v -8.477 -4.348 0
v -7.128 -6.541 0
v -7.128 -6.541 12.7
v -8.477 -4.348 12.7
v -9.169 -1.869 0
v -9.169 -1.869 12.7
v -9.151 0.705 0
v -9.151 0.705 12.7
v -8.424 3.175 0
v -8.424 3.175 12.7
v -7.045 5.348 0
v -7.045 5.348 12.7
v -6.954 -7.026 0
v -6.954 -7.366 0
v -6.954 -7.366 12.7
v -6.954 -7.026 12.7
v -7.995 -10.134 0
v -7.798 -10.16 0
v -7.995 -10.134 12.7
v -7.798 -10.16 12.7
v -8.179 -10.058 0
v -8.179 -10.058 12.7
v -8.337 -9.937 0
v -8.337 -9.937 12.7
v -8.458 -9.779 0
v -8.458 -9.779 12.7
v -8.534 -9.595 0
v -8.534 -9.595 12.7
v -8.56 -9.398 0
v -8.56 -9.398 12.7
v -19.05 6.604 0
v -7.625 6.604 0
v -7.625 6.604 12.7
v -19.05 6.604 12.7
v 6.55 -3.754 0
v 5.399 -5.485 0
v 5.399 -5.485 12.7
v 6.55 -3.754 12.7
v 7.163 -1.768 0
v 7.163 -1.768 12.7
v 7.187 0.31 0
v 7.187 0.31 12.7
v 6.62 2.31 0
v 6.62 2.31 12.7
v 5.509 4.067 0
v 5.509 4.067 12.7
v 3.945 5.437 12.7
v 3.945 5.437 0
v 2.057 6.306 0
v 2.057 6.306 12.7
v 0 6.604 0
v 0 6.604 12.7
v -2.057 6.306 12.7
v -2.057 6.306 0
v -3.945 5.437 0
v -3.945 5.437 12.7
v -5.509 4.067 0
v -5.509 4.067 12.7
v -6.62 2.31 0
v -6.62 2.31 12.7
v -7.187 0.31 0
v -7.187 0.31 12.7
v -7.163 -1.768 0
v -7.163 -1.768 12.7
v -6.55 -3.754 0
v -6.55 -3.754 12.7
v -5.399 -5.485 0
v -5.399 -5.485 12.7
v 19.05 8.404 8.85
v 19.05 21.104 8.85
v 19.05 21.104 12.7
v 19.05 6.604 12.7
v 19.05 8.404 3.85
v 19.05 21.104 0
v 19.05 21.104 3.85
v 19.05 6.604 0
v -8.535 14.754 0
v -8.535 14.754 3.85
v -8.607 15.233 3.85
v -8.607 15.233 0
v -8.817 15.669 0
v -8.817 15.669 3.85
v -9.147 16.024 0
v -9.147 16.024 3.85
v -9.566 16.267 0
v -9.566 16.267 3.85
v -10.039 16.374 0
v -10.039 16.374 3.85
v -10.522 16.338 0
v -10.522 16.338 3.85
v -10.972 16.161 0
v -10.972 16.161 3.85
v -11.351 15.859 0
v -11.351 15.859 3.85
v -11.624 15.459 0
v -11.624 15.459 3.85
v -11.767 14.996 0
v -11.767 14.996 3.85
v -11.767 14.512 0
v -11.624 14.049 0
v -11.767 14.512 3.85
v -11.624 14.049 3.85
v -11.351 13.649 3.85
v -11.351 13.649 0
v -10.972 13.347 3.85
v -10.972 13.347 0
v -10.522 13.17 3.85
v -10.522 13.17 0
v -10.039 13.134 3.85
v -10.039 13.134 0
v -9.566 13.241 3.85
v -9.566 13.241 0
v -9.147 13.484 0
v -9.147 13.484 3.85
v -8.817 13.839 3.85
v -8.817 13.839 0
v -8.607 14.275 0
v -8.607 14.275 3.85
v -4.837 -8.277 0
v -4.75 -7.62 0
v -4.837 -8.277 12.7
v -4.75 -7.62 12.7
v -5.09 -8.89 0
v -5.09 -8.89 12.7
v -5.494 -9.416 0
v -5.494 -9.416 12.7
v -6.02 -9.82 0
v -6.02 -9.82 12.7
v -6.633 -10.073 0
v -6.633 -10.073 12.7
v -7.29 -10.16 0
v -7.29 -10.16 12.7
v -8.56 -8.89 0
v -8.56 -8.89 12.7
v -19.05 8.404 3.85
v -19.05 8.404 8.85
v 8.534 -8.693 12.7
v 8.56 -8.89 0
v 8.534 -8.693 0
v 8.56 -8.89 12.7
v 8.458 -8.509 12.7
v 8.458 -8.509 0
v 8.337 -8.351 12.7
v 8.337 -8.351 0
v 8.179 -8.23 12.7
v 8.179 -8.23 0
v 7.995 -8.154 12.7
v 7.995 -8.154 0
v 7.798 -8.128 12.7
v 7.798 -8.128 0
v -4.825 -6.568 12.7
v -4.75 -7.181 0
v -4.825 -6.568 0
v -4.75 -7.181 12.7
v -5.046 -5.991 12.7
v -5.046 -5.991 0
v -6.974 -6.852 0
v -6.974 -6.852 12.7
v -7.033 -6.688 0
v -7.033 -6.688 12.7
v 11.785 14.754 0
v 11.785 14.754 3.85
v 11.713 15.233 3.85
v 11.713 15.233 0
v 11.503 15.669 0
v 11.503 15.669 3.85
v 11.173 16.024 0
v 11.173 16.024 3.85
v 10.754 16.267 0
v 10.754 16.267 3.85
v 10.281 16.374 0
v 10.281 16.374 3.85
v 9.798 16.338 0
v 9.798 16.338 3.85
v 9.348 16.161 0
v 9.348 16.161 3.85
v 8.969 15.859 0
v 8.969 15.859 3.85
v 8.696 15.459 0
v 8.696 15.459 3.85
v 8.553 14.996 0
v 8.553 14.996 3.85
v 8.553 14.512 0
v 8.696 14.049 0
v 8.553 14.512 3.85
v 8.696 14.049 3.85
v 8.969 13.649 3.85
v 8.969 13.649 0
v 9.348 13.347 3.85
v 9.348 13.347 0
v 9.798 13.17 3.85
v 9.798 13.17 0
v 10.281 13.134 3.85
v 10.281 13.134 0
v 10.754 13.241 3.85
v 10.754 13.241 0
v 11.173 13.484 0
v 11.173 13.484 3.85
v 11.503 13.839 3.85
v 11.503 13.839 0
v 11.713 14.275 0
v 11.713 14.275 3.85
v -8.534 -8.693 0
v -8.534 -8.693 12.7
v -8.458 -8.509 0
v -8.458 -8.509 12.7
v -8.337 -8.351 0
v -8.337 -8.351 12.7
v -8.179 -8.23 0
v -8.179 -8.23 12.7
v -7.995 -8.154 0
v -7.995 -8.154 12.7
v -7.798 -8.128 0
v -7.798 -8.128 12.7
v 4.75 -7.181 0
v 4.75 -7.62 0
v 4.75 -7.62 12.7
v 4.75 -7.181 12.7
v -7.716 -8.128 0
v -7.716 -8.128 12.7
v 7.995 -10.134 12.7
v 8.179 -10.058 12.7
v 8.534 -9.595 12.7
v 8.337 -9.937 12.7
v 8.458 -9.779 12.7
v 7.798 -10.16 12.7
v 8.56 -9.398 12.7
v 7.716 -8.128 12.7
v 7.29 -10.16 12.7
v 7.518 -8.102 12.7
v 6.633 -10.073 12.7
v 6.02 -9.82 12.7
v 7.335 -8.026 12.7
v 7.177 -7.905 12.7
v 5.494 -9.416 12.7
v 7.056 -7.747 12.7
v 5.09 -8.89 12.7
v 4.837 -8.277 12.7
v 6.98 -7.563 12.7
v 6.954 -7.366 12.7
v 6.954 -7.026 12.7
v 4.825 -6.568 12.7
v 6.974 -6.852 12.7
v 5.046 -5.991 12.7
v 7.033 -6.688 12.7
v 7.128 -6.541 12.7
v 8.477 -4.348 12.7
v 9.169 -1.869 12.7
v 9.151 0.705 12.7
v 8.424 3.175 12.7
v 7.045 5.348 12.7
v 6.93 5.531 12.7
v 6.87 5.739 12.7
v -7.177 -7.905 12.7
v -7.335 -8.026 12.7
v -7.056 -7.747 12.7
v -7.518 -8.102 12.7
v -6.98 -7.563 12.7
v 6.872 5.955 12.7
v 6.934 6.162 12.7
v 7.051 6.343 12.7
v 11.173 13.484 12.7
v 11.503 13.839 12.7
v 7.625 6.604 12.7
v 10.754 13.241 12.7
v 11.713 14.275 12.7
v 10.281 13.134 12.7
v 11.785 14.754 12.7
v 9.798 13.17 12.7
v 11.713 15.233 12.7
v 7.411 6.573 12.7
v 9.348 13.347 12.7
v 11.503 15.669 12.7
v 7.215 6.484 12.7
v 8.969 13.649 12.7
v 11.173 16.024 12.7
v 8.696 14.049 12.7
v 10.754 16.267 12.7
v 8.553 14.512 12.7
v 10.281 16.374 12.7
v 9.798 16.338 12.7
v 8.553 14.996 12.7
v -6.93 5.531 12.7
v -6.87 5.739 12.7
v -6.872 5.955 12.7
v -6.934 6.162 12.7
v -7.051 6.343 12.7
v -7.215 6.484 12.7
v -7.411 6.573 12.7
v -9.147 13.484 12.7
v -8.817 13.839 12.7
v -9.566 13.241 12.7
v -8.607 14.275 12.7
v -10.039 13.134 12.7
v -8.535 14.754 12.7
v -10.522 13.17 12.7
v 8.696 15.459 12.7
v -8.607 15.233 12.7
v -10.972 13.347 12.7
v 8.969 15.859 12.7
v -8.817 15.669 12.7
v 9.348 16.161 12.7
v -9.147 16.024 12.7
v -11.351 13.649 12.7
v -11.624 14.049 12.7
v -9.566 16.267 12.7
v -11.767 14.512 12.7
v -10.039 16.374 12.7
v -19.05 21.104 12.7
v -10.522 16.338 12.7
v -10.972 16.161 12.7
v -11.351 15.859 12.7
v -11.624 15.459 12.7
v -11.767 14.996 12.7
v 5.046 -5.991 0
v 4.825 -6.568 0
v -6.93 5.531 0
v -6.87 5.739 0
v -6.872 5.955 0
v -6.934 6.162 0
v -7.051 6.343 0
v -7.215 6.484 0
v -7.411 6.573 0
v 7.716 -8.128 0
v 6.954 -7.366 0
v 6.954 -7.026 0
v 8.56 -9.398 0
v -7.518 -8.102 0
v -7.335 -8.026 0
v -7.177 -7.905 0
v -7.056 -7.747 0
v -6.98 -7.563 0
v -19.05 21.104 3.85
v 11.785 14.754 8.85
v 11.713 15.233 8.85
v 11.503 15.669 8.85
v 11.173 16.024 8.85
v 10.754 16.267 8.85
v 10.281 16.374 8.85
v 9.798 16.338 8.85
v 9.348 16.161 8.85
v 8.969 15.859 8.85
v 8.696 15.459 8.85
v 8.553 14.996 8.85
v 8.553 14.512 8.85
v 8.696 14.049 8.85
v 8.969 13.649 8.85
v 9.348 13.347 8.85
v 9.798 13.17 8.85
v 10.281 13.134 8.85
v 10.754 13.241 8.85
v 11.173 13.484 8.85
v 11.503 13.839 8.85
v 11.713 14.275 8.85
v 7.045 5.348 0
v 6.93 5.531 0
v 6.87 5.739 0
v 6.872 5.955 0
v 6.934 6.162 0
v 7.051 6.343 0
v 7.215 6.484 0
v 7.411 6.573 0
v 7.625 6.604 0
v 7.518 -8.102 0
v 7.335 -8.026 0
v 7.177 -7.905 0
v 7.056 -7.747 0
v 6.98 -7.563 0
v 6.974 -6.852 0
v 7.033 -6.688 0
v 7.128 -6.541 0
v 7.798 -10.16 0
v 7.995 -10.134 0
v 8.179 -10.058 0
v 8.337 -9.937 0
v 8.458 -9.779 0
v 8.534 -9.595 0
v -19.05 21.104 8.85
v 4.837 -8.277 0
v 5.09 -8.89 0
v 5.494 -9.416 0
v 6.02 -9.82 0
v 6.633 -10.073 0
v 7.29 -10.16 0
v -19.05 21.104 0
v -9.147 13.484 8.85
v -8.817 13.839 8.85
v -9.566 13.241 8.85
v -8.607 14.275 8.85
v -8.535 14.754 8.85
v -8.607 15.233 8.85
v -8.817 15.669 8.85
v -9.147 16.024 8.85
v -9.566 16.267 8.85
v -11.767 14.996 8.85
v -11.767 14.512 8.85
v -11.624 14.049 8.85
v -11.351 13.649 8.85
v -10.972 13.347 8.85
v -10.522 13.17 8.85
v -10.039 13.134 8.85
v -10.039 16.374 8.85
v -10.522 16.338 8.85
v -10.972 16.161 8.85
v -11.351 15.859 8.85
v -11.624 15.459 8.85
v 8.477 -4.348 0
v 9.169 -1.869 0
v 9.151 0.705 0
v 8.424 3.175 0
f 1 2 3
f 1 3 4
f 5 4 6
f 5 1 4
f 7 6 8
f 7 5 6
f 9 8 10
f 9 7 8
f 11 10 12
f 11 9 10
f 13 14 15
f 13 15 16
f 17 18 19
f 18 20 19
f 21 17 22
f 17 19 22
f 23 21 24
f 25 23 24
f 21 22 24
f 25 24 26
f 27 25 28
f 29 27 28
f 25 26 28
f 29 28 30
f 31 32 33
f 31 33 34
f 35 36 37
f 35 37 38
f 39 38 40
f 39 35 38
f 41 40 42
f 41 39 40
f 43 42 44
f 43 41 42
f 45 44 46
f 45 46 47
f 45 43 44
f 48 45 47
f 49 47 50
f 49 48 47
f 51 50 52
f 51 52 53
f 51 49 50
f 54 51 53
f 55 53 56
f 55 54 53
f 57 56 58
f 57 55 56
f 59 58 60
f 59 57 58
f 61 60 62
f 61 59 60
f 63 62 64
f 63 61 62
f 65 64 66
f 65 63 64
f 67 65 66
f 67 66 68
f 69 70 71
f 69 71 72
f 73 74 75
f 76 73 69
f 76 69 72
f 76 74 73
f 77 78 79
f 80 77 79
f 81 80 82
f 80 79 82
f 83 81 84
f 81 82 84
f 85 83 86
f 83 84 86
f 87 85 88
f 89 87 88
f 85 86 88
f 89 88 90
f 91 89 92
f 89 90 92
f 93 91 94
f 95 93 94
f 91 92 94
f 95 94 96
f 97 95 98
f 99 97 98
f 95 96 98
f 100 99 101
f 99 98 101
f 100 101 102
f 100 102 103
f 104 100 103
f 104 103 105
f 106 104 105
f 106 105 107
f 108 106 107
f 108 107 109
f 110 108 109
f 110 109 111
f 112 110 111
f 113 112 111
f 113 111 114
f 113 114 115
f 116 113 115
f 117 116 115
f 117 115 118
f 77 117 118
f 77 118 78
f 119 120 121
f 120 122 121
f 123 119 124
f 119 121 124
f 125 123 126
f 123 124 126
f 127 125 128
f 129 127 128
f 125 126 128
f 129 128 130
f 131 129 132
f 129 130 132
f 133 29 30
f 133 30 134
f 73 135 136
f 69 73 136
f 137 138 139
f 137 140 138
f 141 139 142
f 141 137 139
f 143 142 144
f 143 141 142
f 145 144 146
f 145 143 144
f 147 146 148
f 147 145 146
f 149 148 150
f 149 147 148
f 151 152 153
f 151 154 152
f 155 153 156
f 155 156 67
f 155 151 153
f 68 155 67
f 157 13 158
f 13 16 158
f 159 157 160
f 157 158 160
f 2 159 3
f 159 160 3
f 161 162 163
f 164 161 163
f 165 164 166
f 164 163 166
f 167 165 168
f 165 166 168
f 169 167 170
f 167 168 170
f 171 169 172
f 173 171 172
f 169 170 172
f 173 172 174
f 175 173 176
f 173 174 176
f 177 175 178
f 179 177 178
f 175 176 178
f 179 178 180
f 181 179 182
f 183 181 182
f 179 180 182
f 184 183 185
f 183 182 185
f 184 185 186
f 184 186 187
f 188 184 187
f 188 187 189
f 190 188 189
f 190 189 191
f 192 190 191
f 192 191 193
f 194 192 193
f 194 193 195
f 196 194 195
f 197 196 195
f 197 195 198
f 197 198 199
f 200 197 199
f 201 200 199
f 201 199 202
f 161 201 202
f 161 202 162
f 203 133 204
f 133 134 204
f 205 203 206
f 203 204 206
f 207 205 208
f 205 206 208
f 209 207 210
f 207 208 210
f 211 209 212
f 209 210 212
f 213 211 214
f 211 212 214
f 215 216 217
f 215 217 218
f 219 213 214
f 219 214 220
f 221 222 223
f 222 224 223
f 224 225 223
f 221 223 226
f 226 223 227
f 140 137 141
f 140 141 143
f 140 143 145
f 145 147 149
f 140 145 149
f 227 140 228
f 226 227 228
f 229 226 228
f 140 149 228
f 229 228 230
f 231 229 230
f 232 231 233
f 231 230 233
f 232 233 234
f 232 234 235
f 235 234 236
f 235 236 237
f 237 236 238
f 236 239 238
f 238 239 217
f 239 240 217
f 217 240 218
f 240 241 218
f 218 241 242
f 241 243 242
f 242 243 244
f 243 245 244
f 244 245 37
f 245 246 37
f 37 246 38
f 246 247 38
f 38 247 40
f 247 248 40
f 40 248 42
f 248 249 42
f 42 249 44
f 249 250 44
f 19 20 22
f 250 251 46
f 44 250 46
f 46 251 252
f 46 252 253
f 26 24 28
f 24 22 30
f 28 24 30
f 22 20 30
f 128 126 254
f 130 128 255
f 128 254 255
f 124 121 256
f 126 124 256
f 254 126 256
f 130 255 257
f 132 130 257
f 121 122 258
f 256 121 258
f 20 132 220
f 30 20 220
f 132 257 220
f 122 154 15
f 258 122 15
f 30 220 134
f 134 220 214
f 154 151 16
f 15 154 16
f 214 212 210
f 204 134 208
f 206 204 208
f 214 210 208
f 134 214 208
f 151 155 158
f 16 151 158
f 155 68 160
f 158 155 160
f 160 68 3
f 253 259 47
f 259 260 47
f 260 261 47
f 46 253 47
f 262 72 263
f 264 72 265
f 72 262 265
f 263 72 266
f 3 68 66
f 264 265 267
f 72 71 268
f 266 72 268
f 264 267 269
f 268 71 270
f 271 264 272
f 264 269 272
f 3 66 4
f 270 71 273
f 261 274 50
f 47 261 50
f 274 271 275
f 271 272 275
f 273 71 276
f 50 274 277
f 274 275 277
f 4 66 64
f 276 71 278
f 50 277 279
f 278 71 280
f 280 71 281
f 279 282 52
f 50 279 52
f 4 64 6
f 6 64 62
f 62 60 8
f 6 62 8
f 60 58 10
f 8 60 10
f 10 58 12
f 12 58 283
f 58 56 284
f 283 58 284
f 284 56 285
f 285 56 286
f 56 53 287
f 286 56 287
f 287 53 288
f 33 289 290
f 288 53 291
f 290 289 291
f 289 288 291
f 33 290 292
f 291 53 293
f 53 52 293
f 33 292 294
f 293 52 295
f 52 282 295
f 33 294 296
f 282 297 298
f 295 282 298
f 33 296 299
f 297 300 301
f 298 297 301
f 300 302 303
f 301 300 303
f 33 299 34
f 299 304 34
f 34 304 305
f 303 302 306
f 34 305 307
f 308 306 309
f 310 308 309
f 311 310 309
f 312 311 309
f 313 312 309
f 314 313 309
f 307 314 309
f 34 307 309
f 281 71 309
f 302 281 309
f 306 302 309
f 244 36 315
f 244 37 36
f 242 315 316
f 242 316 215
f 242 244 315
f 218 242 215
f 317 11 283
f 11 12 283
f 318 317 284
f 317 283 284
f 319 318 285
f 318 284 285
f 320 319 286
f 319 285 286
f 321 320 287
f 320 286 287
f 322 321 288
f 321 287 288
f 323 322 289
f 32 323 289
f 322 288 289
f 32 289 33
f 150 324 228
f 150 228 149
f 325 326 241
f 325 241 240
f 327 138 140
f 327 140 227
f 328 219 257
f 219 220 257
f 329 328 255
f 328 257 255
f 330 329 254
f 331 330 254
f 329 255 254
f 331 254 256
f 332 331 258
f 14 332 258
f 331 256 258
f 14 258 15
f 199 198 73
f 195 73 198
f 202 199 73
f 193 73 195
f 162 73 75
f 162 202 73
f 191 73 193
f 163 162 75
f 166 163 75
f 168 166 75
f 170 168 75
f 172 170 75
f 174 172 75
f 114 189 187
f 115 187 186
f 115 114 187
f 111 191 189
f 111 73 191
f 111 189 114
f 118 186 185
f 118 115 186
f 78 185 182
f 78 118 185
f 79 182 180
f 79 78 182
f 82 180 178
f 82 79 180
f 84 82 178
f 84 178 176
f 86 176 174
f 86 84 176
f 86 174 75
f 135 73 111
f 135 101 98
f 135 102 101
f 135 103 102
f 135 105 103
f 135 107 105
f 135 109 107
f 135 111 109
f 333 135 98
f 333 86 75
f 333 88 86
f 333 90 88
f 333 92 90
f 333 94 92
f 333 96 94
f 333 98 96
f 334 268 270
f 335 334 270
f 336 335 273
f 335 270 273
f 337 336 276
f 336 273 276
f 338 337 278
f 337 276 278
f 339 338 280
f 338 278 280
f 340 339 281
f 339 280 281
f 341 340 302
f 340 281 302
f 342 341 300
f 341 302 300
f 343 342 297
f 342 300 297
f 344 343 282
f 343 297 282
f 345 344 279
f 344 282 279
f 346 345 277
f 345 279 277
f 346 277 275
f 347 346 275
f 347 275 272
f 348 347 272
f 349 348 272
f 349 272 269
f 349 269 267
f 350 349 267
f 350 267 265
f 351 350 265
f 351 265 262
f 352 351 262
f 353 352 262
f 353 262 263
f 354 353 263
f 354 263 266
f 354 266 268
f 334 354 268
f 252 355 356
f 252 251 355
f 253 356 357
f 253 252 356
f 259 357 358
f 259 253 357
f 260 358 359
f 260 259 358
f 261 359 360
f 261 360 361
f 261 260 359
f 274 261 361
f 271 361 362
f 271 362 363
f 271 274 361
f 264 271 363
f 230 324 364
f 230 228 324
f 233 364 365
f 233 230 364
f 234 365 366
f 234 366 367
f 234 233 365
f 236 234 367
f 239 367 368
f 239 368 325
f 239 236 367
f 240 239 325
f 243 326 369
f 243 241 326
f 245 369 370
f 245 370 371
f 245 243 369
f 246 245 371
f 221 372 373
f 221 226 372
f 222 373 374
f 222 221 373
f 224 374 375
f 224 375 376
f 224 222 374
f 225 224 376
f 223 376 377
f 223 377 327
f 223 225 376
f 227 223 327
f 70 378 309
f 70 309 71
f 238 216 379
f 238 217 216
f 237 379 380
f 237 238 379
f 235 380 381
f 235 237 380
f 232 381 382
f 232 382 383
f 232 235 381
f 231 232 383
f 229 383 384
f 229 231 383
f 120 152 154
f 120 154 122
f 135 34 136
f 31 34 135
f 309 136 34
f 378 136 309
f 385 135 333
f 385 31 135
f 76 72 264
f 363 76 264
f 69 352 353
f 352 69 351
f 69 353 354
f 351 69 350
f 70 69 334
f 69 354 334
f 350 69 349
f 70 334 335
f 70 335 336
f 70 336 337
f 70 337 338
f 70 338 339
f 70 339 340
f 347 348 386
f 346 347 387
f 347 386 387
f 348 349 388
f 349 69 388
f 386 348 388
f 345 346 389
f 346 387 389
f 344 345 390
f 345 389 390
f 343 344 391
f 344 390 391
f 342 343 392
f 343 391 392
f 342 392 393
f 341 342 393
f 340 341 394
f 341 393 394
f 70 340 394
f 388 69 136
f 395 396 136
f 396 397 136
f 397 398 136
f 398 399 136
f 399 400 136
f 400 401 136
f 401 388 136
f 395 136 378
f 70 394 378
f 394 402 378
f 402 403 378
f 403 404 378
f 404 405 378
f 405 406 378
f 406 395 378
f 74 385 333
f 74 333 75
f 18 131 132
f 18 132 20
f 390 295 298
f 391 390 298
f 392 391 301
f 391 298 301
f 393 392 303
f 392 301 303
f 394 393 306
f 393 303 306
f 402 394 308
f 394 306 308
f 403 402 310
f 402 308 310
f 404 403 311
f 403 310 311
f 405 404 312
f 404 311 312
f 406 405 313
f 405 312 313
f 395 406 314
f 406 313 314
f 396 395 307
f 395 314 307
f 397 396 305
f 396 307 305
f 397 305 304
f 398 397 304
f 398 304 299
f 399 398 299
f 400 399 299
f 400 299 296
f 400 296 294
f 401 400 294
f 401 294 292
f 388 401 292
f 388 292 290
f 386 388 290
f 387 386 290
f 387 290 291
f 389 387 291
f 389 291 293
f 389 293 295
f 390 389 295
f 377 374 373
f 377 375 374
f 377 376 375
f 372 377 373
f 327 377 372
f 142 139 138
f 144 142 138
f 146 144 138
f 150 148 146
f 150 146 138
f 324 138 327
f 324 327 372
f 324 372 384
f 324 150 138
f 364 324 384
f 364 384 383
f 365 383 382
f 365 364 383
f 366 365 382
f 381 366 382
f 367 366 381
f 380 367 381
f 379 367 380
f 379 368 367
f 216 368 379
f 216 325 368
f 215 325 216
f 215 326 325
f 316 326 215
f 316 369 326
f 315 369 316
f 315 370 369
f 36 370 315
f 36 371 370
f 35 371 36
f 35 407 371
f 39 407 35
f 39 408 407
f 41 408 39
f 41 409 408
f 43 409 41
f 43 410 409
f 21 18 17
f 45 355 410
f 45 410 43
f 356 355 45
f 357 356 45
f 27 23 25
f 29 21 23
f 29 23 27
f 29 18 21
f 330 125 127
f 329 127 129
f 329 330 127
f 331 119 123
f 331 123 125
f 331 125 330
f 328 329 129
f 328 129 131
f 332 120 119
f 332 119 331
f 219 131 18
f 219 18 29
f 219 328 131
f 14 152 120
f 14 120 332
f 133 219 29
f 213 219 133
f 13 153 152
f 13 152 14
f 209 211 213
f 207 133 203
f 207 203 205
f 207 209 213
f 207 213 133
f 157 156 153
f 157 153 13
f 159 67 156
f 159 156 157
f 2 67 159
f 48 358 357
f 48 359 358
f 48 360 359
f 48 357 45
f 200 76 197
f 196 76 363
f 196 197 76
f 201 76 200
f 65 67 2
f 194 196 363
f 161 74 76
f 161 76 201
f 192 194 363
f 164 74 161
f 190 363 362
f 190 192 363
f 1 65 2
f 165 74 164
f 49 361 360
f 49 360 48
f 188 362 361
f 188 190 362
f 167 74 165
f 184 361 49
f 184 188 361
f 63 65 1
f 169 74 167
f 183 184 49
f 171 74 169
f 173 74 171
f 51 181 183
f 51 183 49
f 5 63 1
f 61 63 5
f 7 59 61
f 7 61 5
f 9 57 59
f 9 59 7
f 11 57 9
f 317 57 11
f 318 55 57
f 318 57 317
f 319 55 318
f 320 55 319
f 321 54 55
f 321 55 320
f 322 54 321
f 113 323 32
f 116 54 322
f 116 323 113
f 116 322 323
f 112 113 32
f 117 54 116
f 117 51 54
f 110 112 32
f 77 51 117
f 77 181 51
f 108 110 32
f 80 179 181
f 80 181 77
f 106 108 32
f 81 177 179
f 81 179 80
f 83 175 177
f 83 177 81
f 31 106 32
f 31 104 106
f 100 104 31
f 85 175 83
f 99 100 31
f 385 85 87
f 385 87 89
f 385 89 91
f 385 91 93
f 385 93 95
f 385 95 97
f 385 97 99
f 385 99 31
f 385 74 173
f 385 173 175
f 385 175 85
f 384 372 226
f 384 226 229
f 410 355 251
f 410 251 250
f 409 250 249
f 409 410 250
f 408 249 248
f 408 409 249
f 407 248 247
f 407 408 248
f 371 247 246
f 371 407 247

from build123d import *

# Parameters (mm, degrees)
BOSS_EXTRUDE1_DEPTH     = 12.7
SKETCH5_W               = 5
SKETCH5_H               = 12.7
CUT_EXTRUDE2_DEPTH      = 1
CUT_EXTRUDE2_DEPTH_BACK = 39.1
SKETCH6_R               = 1.625
CUT_EXTRUDE3_DEPTH      = 13.7
FILLET1_R               = 2.54
FILLET2_R               = 0.762


with BuildPart() as part:
    # Sketch1 → Boss-Extrude1 (new body)
    with BuildSketch(Plane.XY):
        with BuildLine():
            Line((-4.75, -6.123225575), (-4.75, -10.16))
            Line((-4.75, -10.16), (-8.56, -10.16))
            Line((-8.56, -10.16), (-8.56, -8.128))
            Line((-8.56, -8.128), (-6.953663109, -8.128))
            Line((-6.953663109, -8.128), (-6.953663109, -6.745923719))
            ThreePointArc((-6.953663109, -6.745923719), (-9.212293425, 0.188355946), (-5.744562647, 6.604))
            Line((-5.744562647, 6.604), (-19.05, 6.604))
            Line((-19.05, 6.604), (-19.05, 21.104))
            Line((-19.05, 21.104), (19.05, 21.104))
            Line((19.05, 21.104), (19.05, 6.604))
            Line((19.05, 6.604), (5.744562647, 6.604))
            ThreePointArc((5.744562647, 6.604), (9.212293425, 0.188355946), (6.953663109, -6.745923719))
            Line((6.953663109, -6.745923719), (6.953663109, -8.128))
            Line((6.953663109, -8.128), (8.56, -8.128))
            Line((8.56, -8.128), (8.56, -10.16))
            Line((8.56, -10.16), (4.75, -10.16))
            Line((4.75, -10.16), (4.75, -6.123225575))
            ThreePointArc((4.75, -6.123225575), (0, 6.604), (-4.75, -6.123225575))
        make_face()
    extrude(amount=BOSS_EXTRUDE1_DEPTH)

    # Sketch5 → Cut-Extrude2 (cut, two sides)
    with BuildSketch(Plane.ZY.offset(19.05)) as cut_extrude2_sk:
        with Locations((6.35, 14.754)):
            Rectangle(SKETCH5_W, SKETCH5_H)
    extrude(amount=CUT_EXTRUDE2_DEPTH, mode=Mode.SUBTRACT)
    extrude(cut_extrude2_sk.sketch, amount=-CUT_EXTRUDE2_DEPTH_BACK, mode=Mode.SUBTRACT)

    # Sketch6 → Cut-Extrude3 (cut, through all)
    with BuildSketch(Plane.XY.offset(12.7)):
        with Locations((-10.16, 14.754)):
            Circle(SKETCH6_R)
        with Locations((10.16, 14.754)):
            Circle(SKETCH6_R)
    extrude(amount=-CUT_EXTRUDE3_DEPTH, mode=Mode.SUBTRACT)

    # Fillet1
    fillet1_edges = [part.edges().sort_by_distance(p)[0] for p in [
        (4.75, -10.16, 6.35),
        (4.75, -6.123225575, 6.35),
        (-4.75, -6.123225575, 6.35),
        (-4.75, -10.16, 6.35),
    ]]
    fillet(fillet1_edges, radius=FILLET1_R)

    # Fillet2
    fillet2_edges = [part.edges().sort_by_distance(p)[0] for p in [
        (-8.56, -8.128, 6.35),
        (-6.953663109, -8.128, 6.35),
        (-6.953663109, -6.745923719, 6.35),
        (-5.744562647, 6.604, 6.35),
        (5.744562647, 6.604, 6.35),
        (6.953663109, -6.745923719, 6.35),
        (6.953663109, -8.128, 6.35),
        (8.56, -8.128, 6.35),
        (8.56, -10.16, 6.35),
        (-8.56, -10.16, 6.35),
    ]]
    fillet(fillet2_edges, radius=FILLET2_R)


solid = part.part
